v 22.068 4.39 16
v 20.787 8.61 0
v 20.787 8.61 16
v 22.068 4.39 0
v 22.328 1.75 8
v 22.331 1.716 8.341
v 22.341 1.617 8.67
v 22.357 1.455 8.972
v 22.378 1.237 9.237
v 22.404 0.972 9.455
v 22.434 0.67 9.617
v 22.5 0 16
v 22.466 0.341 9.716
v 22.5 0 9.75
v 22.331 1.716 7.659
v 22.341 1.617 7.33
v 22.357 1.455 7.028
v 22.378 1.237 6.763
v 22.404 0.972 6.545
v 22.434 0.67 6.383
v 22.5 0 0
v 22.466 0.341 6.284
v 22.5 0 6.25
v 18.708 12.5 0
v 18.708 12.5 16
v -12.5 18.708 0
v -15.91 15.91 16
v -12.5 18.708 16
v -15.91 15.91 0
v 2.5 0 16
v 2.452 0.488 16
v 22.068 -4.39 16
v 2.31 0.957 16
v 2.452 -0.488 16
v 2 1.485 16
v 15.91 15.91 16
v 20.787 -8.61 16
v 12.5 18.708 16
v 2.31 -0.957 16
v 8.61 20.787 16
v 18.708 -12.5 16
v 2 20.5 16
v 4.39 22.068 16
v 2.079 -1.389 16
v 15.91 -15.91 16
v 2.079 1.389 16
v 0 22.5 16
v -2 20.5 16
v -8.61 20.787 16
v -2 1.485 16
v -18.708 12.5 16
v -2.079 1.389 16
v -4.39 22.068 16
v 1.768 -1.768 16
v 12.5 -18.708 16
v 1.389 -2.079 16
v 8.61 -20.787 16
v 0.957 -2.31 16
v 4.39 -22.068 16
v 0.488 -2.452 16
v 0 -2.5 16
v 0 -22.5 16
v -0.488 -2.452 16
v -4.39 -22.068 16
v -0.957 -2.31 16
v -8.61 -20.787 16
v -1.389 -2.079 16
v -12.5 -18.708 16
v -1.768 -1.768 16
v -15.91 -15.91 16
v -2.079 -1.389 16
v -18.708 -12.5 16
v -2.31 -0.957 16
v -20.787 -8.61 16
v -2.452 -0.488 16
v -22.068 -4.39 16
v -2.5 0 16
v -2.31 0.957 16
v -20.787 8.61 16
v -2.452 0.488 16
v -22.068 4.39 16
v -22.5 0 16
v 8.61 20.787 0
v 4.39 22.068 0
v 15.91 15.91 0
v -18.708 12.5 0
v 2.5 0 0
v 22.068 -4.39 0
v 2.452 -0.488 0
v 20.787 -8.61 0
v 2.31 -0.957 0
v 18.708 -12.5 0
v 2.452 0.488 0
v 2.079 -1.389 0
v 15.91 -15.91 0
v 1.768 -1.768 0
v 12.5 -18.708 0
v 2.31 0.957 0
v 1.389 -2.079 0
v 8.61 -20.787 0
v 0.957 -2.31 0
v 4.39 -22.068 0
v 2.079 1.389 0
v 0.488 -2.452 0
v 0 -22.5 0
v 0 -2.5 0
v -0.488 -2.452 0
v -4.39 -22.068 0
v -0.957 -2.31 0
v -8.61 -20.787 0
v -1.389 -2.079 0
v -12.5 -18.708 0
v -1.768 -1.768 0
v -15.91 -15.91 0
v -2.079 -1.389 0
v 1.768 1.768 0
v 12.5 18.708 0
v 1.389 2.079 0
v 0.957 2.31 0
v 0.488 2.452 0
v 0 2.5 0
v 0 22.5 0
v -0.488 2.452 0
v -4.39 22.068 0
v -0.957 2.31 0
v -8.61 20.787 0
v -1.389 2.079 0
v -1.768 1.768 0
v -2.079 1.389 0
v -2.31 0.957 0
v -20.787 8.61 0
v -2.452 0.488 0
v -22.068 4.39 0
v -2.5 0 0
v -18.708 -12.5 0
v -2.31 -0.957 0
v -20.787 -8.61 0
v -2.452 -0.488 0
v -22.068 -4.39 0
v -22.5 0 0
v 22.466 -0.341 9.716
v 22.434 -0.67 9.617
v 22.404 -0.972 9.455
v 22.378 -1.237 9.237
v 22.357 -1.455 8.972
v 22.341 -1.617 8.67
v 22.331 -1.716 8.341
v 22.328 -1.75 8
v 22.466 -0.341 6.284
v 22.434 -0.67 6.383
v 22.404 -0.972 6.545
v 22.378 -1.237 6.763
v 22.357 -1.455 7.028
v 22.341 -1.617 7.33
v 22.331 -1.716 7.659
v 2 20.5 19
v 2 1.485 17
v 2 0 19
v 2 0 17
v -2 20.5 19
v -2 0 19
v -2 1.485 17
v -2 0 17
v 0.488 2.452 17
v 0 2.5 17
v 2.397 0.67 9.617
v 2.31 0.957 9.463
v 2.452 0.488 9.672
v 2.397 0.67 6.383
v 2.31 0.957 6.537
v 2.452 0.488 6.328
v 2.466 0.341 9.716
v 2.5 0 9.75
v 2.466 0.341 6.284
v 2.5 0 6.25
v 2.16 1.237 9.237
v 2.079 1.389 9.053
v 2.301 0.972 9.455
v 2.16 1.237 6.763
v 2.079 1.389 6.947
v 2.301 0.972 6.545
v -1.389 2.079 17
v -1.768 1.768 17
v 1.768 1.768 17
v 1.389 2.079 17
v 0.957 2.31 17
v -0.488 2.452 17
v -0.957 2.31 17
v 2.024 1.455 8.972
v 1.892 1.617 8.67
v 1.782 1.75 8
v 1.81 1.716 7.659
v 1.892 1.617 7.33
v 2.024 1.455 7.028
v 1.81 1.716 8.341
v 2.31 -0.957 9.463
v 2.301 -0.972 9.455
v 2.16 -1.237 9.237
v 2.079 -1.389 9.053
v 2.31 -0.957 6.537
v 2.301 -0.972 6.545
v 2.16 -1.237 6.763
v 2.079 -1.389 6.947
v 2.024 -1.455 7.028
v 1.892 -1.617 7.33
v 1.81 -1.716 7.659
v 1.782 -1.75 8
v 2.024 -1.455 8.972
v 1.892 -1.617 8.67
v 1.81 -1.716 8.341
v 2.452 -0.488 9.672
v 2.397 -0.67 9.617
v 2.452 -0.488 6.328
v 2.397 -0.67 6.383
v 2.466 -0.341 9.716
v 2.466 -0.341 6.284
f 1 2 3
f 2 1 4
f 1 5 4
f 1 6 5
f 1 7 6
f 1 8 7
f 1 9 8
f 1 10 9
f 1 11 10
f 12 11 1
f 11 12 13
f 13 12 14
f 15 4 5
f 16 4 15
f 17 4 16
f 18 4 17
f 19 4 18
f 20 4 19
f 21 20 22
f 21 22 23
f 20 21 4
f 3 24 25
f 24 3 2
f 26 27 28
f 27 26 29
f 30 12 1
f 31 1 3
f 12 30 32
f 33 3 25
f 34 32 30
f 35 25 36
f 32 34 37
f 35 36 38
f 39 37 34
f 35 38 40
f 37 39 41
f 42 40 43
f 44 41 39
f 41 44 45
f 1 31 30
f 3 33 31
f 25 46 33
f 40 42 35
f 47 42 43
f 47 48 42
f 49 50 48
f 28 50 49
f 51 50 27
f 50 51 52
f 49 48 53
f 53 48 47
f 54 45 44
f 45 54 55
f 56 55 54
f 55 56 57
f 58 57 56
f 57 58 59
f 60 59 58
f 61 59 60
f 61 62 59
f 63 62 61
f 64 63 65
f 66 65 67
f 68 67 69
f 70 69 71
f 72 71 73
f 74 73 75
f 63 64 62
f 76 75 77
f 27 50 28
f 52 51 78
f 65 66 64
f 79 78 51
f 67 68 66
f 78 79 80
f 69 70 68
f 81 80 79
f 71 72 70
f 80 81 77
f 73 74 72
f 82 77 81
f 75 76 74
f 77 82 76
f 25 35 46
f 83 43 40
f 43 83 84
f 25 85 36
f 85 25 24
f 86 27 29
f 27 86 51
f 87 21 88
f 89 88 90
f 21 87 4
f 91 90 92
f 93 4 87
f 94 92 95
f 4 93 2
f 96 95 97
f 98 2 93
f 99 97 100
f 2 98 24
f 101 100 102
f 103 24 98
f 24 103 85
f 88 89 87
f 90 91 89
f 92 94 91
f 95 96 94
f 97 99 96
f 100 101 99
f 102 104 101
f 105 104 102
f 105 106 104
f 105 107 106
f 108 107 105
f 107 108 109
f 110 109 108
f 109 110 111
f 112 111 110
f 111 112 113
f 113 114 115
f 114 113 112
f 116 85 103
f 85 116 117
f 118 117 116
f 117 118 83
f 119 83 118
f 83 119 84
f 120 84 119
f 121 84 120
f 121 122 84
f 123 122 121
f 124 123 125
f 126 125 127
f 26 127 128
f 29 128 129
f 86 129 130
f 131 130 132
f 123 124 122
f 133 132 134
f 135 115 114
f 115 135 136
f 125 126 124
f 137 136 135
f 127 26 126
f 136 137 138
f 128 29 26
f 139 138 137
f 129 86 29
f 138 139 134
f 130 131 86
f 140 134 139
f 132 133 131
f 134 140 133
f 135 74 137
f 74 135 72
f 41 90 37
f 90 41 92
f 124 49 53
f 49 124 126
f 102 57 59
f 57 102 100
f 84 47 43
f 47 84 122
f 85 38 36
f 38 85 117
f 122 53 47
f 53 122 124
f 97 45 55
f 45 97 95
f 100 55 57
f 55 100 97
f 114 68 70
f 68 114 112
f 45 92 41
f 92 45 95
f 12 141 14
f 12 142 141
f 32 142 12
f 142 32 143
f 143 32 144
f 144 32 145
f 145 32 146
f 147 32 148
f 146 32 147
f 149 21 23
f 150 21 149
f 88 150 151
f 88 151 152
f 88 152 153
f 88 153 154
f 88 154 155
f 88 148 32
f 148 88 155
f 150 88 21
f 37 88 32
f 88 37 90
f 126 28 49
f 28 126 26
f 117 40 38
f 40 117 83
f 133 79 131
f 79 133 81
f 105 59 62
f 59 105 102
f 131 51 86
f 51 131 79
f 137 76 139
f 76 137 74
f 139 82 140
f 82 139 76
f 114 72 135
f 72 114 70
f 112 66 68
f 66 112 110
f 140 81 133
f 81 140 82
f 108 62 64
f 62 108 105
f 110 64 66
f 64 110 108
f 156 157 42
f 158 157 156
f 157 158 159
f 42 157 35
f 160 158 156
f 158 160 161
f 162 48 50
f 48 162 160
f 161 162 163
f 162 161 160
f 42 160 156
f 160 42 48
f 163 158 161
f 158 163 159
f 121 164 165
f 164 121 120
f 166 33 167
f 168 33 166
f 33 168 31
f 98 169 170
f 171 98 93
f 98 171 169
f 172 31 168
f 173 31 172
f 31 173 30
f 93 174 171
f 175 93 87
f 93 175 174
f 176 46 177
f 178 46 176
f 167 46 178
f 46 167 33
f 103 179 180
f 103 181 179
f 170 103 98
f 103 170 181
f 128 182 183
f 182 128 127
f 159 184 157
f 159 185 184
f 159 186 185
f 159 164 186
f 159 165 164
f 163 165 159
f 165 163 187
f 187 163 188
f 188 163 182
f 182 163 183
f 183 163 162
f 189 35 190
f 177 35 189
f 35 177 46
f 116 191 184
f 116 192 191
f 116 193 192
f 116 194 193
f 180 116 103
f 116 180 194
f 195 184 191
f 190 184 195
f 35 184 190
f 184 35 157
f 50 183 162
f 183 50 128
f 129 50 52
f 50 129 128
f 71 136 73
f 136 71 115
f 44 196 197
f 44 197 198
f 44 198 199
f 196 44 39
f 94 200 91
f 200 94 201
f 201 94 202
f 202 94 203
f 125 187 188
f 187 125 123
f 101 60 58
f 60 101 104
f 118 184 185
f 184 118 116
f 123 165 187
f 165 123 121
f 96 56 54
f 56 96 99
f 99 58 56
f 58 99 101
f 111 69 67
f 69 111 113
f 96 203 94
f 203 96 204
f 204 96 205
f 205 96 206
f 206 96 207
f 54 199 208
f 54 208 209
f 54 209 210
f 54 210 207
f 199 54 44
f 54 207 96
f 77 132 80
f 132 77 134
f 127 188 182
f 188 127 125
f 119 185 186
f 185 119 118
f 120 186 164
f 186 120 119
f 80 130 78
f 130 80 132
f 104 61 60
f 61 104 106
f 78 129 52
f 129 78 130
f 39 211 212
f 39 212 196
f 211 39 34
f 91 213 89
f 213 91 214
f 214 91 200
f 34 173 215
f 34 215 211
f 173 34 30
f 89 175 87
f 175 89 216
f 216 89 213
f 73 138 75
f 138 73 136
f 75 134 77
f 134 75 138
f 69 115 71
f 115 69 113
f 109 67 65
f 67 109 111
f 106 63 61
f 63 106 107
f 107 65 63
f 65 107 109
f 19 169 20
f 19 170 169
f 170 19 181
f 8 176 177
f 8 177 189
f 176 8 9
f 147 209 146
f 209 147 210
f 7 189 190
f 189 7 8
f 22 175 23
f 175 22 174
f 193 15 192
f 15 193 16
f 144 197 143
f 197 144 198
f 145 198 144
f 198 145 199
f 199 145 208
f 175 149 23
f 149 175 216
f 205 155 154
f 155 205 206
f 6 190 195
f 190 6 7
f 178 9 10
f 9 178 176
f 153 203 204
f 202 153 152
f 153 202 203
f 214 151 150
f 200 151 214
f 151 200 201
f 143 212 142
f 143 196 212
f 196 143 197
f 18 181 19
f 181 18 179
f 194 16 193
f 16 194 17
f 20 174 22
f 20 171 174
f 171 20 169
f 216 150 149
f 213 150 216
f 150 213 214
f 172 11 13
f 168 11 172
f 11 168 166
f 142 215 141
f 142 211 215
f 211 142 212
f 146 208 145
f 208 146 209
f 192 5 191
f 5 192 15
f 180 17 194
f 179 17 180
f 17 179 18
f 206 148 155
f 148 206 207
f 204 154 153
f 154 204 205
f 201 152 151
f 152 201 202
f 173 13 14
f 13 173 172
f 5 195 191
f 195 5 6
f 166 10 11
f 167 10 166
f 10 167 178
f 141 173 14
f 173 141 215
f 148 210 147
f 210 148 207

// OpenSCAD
$fn = 32;

// ----------------------------------------------------------------------
// Control knob: pointer knob
// ----------------------------------------------------------------------

// --- parameters (mm) ---
rib_w = 4;                // pointer rib width
rib_h = 4;                // pointer rib height
knob_d = 45;              // knob body diameter
knob_h = 16;              // knob body height
bore_d = 5;               // shaft bore diameter
set_d = 3.5;              // set screw bore diameter

rib_poke = rib_h - 1;  // rib height above the top
total_h = knob_h + rib_h - 1;  // overall height

difference() {
  union() {
    cylinder(h = knob_h, d = knob_d);
    translate([-rib_w / 2, 0, knob_h - 1])
      cube([rib_w, knob_d / 2 - 2, rib_h]);
  }
  translate([0, 0, -1]) cylinder(h = knob_h + 2, d = bore_d);
  translate([-1, 0, knob_h / 2]) rotate([0, 90, 0])
    cylinder(h = knob_d / 2 + bore_d / 2 + 2, d = set_d);}
